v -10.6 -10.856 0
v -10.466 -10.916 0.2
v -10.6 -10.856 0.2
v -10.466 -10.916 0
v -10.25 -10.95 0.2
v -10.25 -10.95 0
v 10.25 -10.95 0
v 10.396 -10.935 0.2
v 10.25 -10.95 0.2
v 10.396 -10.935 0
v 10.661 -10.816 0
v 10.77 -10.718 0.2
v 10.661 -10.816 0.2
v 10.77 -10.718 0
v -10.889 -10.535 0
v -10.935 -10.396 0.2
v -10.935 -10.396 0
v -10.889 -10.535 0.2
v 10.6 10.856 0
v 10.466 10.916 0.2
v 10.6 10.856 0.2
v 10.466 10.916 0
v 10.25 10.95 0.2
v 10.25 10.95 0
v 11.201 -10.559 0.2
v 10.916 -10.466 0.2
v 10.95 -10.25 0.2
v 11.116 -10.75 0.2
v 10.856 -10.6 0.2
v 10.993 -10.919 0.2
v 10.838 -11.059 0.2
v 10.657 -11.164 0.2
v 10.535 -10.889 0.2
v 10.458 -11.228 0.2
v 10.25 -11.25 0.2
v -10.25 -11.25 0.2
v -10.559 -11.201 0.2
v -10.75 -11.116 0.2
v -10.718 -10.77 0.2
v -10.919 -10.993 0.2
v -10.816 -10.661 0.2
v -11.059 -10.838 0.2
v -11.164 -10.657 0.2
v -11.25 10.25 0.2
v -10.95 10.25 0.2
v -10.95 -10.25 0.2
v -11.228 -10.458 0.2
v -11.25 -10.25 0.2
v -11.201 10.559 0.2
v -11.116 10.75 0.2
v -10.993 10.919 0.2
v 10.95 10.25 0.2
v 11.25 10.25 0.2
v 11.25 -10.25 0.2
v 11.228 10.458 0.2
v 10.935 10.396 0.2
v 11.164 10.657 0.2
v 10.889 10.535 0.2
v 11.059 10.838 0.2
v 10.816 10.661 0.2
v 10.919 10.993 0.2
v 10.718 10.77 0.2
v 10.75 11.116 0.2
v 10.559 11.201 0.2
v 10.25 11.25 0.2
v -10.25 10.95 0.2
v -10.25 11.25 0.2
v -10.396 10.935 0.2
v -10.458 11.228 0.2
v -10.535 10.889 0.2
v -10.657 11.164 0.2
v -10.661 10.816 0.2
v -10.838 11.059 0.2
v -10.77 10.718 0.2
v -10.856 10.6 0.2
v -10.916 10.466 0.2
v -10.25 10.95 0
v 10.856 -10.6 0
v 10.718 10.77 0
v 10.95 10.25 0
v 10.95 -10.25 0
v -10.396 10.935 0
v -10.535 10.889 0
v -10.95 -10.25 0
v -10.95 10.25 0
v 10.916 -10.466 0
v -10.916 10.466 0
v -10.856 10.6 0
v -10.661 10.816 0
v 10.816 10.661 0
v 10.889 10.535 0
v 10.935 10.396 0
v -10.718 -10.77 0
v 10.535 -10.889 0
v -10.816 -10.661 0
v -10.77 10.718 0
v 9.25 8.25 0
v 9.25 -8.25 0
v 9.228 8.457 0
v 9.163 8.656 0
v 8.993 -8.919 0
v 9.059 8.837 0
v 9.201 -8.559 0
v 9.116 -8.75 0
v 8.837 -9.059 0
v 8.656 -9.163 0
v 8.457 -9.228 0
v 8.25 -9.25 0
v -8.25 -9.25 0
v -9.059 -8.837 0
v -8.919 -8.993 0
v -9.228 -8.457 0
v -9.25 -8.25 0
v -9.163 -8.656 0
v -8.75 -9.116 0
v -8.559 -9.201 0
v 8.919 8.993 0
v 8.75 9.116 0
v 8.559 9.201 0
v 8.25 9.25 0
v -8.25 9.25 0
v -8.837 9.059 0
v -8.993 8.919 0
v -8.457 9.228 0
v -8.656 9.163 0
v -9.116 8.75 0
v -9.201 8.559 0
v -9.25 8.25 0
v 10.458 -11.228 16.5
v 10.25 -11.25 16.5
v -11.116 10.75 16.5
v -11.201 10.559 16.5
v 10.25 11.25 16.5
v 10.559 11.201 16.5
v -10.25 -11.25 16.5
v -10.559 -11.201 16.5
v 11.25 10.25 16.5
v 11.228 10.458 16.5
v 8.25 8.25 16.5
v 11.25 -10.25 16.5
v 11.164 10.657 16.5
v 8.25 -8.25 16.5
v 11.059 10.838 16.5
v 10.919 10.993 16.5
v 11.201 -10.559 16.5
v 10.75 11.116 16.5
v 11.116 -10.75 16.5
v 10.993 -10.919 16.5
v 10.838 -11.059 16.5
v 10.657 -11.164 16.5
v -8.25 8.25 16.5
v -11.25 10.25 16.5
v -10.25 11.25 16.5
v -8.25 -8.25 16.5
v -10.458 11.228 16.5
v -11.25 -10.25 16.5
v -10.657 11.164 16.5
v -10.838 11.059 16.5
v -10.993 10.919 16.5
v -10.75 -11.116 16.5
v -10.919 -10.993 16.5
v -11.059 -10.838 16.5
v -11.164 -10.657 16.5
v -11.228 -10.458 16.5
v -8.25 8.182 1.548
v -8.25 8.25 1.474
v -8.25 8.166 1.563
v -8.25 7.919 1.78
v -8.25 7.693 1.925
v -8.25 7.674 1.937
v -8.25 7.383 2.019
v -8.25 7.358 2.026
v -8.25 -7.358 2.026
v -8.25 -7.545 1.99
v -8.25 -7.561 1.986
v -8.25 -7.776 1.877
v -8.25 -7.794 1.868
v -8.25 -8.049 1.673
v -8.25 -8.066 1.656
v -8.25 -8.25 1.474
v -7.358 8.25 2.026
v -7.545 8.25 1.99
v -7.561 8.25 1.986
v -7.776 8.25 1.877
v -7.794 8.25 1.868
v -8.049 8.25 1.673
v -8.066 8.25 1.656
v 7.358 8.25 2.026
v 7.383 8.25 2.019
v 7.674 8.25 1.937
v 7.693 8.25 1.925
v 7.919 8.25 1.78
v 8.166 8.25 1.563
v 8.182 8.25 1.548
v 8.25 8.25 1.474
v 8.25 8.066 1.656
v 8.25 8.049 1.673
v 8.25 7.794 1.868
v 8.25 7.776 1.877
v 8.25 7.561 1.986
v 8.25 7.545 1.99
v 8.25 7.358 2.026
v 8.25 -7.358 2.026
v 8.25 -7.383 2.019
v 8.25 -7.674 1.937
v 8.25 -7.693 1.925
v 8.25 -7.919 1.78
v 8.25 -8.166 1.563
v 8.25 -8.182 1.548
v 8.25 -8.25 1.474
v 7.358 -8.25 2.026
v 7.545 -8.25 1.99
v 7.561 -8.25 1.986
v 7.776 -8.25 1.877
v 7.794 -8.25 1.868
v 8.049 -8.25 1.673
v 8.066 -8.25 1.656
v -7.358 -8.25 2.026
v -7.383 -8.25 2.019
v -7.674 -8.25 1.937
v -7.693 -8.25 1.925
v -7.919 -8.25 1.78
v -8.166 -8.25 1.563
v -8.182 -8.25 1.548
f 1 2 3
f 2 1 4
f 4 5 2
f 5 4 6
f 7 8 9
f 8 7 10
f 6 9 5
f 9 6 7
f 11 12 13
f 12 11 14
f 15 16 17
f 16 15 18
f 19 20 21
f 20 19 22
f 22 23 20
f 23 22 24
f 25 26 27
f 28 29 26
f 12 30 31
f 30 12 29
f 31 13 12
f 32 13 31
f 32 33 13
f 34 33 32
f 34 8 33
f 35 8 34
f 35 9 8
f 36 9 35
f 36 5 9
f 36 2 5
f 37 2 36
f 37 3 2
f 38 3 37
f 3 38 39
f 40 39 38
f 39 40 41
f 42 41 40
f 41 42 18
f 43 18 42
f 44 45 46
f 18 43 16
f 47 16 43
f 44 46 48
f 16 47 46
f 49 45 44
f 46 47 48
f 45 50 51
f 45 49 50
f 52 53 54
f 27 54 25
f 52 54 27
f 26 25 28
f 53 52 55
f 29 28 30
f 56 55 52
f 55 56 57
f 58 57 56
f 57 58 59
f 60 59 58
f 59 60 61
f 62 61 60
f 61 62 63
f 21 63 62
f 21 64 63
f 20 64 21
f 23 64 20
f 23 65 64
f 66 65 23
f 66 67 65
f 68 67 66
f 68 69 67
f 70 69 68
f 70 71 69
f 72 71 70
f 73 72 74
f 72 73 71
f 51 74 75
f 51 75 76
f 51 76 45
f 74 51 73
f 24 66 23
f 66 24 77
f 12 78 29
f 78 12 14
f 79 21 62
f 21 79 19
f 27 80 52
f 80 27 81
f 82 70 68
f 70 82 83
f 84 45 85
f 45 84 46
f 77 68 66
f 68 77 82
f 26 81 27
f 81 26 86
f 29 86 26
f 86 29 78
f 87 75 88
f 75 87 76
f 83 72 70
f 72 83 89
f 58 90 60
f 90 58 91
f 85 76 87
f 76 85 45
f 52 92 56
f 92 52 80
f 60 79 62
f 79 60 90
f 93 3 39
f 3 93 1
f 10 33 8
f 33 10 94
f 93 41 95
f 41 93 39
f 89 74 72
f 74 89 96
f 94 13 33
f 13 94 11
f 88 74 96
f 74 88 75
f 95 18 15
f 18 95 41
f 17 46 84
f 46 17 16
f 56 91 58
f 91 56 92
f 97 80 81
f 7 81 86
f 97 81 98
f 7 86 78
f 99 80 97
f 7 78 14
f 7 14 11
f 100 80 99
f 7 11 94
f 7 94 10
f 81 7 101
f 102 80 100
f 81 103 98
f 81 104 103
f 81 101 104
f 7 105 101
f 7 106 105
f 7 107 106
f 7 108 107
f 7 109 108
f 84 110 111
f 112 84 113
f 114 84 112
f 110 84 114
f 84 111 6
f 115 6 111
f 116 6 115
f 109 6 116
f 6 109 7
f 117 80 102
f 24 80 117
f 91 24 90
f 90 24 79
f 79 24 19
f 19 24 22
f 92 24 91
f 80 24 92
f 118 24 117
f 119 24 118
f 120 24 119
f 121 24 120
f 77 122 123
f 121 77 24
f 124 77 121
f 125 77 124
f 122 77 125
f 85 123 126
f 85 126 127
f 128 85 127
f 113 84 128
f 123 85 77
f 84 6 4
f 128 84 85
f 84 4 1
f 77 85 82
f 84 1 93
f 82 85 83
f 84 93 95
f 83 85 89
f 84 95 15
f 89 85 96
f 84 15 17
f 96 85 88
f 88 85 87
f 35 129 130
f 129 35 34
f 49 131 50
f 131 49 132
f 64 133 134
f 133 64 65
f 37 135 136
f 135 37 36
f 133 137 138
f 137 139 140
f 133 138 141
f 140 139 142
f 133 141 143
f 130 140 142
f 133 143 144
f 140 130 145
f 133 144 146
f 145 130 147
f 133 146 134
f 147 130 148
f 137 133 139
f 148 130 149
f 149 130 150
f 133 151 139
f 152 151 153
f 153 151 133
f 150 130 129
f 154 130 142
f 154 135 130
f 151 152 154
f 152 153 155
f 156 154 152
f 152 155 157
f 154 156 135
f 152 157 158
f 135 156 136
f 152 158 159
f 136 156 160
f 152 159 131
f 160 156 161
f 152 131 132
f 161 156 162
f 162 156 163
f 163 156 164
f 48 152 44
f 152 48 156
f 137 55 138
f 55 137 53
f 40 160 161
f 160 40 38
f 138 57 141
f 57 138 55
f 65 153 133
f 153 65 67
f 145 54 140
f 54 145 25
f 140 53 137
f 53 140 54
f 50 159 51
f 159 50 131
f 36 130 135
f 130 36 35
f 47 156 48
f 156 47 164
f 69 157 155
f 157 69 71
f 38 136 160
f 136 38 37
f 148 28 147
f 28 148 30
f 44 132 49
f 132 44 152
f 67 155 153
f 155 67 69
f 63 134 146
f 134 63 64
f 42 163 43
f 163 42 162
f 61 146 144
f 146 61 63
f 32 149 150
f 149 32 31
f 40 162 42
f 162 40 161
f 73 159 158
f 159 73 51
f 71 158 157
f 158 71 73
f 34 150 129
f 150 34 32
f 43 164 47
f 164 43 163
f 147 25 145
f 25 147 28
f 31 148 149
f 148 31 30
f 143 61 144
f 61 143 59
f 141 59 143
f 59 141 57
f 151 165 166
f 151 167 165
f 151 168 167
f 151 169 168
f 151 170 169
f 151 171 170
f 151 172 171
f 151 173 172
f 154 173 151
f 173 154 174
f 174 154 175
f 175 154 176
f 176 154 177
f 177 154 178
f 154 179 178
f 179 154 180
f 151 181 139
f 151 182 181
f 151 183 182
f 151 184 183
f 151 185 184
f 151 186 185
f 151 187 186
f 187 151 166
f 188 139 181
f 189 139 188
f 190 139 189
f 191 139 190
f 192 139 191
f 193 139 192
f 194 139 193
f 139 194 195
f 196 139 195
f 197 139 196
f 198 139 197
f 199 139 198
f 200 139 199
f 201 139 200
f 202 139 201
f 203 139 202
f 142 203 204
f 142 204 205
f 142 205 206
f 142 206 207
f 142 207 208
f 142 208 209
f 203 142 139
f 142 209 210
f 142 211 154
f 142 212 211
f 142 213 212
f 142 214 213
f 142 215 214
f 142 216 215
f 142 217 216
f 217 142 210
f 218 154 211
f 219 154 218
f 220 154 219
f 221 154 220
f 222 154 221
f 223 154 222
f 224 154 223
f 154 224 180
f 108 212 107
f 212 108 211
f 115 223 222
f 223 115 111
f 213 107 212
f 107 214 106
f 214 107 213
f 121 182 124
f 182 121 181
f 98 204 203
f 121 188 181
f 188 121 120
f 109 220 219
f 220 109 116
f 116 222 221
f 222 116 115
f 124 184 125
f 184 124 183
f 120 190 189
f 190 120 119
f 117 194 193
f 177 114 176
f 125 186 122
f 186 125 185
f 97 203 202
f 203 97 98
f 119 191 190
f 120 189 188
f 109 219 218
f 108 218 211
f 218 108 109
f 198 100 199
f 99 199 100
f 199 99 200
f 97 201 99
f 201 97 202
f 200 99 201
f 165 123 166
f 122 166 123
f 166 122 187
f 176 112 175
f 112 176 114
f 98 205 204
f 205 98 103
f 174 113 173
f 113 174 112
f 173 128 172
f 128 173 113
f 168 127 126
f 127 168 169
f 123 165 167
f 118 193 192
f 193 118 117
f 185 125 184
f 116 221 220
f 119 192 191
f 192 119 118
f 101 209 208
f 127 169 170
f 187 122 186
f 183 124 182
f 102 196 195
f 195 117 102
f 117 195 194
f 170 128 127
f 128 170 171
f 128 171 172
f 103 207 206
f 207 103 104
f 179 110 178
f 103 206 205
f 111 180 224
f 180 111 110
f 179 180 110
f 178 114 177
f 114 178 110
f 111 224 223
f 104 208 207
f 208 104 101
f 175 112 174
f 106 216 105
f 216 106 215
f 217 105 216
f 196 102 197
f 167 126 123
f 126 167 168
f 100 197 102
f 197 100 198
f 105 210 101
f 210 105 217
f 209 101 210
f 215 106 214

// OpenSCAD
eps = 0.001;
$fn = 30;
layer = 0.2;

die_cavity_width = 16.5;
cover_wall = 3;
cover_exterior_width = die_cavity_width + 2*cover_wall;

module die_cover() {
  
  difference() {
    union() {
      linear_extrude(layer)
        offset(0.7)
          square(cover_exterior_width-2, center=true);
      translate([0, 0, layer])
        linear_extrude(die_cavity_width-layer)
          offset(1)
            square(cover_exterior_width-2, center=true);
    }

    translate([0, 0, -eps])
      linear_extrude(die_cavity_width + 1)
        square(die_cavity_width, center=true);
    
    translate([0, 0, -eps])
      linear_extrude(cover_exterior_width/2, scale=0.4)
        offset(1)
          square(die_cavity_width, center=true);
  }
}

die_cover();

// TODO:
